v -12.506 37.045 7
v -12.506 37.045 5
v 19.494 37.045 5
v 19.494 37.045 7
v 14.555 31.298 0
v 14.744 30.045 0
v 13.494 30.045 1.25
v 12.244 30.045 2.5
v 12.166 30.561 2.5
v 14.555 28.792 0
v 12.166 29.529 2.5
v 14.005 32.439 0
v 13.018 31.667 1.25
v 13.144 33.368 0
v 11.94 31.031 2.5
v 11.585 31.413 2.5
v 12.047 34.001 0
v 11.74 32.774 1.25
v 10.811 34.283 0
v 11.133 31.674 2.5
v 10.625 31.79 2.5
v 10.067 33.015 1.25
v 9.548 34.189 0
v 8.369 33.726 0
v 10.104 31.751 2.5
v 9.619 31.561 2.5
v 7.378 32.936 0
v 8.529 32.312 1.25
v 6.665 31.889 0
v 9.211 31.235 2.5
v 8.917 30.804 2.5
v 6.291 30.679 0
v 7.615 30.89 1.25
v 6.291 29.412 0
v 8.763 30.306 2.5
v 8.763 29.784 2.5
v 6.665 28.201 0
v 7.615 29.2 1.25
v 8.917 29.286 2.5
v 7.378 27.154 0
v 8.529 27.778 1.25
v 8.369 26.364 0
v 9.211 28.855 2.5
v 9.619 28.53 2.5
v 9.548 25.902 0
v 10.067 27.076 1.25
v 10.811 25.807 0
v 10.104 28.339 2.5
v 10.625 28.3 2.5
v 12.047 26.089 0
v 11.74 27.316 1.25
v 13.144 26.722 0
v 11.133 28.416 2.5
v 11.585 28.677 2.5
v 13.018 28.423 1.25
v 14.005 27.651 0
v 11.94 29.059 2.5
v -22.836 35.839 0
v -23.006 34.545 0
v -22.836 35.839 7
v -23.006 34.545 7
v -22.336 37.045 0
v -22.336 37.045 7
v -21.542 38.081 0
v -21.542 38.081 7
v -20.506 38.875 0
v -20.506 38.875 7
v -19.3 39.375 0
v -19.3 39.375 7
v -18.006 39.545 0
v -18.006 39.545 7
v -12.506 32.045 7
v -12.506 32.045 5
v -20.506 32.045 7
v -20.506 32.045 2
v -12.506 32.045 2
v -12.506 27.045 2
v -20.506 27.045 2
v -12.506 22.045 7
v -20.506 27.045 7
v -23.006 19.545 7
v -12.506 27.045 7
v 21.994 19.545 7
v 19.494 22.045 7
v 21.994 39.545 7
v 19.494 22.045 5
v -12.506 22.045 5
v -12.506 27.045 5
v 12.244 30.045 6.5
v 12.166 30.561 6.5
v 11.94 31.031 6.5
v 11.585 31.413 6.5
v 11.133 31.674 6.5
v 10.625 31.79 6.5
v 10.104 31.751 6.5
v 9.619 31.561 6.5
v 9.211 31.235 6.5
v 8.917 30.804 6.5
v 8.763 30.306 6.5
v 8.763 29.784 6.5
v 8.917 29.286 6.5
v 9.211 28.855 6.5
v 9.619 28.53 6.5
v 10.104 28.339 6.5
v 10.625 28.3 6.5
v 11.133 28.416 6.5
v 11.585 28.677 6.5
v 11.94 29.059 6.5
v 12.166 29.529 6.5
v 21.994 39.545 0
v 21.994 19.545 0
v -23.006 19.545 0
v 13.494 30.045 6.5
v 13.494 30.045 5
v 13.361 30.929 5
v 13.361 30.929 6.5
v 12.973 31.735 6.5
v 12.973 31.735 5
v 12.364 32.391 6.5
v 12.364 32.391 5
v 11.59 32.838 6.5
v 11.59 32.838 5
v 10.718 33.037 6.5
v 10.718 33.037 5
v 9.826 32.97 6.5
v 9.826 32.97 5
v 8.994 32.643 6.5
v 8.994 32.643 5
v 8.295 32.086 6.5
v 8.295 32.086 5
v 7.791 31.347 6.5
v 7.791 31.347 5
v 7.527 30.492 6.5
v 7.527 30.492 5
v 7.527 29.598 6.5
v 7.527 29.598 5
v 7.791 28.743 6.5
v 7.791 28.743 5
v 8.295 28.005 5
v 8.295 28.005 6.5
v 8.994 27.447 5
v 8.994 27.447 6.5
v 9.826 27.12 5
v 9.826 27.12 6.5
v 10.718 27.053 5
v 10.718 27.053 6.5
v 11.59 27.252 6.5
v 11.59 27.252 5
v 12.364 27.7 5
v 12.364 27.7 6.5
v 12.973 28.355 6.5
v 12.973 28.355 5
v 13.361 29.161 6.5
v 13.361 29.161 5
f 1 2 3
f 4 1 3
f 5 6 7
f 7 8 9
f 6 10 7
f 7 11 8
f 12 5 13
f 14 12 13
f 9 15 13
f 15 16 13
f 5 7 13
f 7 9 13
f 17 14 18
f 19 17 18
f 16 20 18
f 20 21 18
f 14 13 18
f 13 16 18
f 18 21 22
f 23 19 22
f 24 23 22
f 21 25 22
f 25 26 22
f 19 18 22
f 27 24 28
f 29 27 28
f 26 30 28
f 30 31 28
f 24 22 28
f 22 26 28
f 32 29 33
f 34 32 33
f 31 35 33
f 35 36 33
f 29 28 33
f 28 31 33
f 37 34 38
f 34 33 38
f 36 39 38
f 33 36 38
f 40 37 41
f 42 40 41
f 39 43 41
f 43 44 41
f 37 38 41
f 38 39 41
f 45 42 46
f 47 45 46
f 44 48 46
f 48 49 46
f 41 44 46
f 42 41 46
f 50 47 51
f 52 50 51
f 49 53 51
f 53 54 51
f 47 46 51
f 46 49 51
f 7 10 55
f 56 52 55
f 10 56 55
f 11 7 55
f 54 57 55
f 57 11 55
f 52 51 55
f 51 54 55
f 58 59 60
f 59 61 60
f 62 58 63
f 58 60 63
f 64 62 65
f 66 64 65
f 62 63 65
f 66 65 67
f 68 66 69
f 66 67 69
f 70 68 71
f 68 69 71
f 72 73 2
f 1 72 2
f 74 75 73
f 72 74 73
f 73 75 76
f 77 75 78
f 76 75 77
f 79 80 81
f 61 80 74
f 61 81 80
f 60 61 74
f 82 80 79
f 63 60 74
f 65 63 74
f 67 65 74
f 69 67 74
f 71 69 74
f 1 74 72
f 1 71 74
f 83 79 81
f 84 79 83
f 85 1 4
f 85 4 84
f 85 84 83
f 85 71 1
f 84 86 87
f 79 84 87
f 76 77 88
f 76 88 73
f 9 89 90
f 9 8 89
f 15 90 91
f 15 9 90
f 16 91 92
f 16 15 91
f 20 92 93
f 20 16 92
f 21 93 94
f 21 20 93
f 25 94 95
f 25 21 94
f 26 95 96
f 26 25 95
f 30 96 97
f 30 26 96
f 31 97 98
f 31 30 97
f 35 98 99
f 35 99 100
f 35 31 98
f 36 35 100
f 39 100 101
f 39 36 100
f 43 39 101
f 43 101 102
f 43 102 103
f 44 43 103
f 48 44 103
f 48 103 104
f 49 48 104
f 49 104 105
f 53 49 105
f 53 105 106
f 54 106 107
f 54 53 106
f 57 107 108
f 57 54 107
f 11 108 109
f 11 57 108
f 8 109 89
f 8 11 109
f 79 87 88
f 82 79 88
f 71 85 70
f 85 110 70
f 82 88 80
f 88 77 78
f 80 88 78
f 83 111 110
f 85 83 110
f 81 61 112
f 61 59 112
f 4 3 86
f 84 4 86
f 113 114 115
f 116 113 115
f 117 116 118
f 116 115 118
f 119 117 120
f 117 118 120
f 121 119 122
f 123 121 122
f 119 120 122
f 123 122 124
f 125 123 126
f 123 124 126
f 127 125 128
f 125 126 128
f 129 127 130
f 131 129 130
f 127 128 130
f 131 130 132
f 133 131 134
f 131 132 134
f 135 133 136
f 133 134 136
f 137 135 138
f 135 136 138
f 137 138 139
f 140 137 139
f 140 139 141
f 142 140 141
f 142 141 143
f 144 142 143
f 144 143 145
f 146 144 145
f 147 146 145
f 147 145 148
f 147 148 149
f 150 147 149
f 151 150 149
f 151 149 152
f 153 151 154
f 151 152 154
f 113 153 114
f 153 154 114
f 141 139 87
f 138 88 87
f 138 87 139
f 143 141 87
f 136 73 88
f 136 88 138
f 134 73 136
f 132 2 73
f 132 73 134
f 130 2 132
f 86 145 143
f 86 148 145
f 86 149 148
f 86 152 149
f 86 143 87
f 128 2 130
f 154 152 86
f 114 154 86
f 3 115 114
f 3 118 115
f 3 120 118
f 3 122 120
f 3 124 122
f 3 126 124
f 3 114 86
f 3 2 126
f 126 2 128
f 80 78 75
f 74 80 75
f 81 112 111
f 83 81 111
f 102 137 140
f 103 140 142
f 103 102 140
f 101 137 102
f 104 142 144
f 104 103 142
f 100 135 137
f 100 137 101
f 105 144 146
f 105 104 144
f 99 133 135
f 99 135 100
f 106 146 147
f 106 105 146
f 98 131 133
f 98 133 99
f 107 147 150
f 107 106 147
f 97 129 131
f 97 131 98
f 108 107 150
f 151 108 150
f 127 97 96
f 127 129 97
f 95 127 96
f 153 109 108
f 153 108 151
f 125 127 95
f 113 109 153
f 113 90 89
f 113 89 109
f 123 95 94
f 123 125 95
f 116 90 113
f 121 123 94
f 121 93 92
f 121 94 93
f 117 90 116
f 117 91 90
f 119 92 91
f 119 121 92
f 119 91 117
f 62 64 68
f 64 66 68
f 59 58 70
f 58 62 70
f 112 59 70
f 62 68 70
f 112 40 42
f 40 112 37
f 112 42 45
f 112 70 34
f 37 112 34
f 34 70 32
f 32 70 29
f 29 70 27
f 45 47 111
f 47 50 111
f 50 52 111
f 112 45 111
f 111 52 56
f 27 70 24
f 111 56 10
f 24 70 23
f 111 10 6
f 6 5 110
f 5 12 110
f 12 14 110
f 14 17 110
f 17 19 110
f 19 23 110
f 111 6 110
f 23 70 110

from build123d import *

# Parameters (mm, degrees)
F0_W      = 4
F0_H      = 5
F0_R      = 3
F0_R_2    = 1.75
F1_DEPTH  = 5
F2_DEPTH  = 7
F3_START  = 2
F1_FACE_R = 1.75
F3_DEPTH  = 6.5
F4_SIZE   = 2.5
F5_START  = 5
F5_DEPTH  = 1.5
F6_R      = 5


with BuildPart() as f1:
    # F0 (on Top) → F1 (new body)
    with BuildSketch(Plane.XY):
        Polygon((21.9938950613, 39.5450913161), (-23.0061049387, 39.5450913161), (-23.0061049387, 19.5450913161), (-9.9312635139, 19.5450913161), (10.0687364861, 19.5450913161), (21.9938950613, 19.5450913161), align=None)
        Polygon((-12.5061049387, 32.0450913161), (-12.5061049387, 37.0450913161), (19.4938950613, 37.0450913161), (19.4938950613, 22.0450913161), (-12.5061049387, 22.0450913161), (-12.5061049387, 27.0450913161), (-16.5061049387, 27.0450913161), (-20.5061049387, 27.0450913161), (-20.5061049387, 32.0450913161), (-16.5061049387, 32.0450913161), align=None, mode=Mode.SUBTRACT)
        with Locations((-18.5061049387, 29.5450913161)):
            Rectangle(F0_W, F0_H)
        with Locations((-14.5061049387, 29.5450913161)):
            Rectangle(F0_W, F0_H)
        Polygon((19.4938950613, 37.0450913161), (-12.5061049387, 37.0450913161), (-12.5061049387, 32.0450913161), (-12.5061049387, 27.0450913161), (-12.5061049387, 22.0450913161), (19.4938950613, 22.0450913161), align=None)
        with Locations((10.4938950613, 30.0450913161)):
            Circle(F0_R, mode=Mode.SUBTRACT)
        with Locations((10.4938950613, 30.0450913161)):
            Circle(F0_R)
        with Locations((10.4938950613, 30.0450913161)):
            Circle(F0_R_2, mode=Mode.SUBTRACT)
    extrude(amount=F1_DEPTH)

    # F0 (on Top) → F2 (join)
    with BuildSketch(Plane.XY):
        Polygon((21.9938950613, 39.5450913161), (-23.0061049387, 39.5450913161), (-23.0061049387, 19.5450913161), (-9.9312635139, 19.5450913161), (10.0687364861, 19.5450913161), (21.9938950613, 19.5450913161), align=None)
        Polygon((-12.5061049387, 32.0450913161), (-12.5061049387, 37.0450913161), (19.4938950613, 37.0450913161), (19.4938950613, 22.0450913161), (-12.5061049387, 22.0450913161), (-12.5061049387, 27.0450913161), (-16.5061049387, 27.0450913161), (-20.5061049387, 27.0450913161), (-20.5061049387, 32.0450913161), (-16.5061049387, 32.0450913161), align=None, mode=Mode.SUBTRACT)
    extrude(amount=F2_DEPTH)

    # F0 (on Top) + F1_face (on face) → F3 (cut)
    with BuildSketch(Plane.XY.offset(F3_START)):
        with Locations((-18.5061049387, 29.5450913161)):
            Rectangle(F0_W, F0_H)
        with Locations((-14.5061049387, 29.5450913161)):
            Rectangle(F0_W, F0_H)
    with BuildSketch(Plane(origin=(1.7944753963, 29.5356658402, 5), x_dir=(1, 0, 0), z_dir=(0, 0, 1)).offset(F3_START)):
        Polygon((-22.300580335, -2.4905745241), (-14.300580335, -2.4905745241), (-14.300580335, -7.4905745241), (17.699419665, -7.4905745241), (17.699419665, 7.5094254759), (-14.300580335, 7.5094254759), (-14.300580335, 2.5094254759), (-22.300580335, 2.5094254759), align=None)
        with Locations((8.699419665, 0.5094254759)):
            Circle(F1_FACE_R, mode=Mode.SUBTRACT)
    extrude(amount=F3_DEPTH, mode=Mode.SUBTRACT)

    # F4
    f4_edges = [f1.edges().sort_by_distance(p)[0] for p in [
        (8.743895, 30.045091, 0),
    ]]
    chamfer(f4_edges, length=F4_SIZE)

    # F0 (on Top) → F5 (join)
    with BuildSketch(Plane.XY.offset(F5_START)):
        with Locations((10.4938950613, 30.0450913161)):
            Circle(F0_R)
        with Locations((10.4938950613, 30.0450913161)):
            Circle(F0_R_2, mode=Mode.SUBTRACT)
    extrude(amount=F5_DEPTH)

    # F6
    f6_edges = [f1.edges().sort_by_distance(p)[0] for p in [
        (-23.006105, 39.545091, 3.5),
    ]]
    fillet(f6_edges, radius=F6_R)


solid = f1.part
